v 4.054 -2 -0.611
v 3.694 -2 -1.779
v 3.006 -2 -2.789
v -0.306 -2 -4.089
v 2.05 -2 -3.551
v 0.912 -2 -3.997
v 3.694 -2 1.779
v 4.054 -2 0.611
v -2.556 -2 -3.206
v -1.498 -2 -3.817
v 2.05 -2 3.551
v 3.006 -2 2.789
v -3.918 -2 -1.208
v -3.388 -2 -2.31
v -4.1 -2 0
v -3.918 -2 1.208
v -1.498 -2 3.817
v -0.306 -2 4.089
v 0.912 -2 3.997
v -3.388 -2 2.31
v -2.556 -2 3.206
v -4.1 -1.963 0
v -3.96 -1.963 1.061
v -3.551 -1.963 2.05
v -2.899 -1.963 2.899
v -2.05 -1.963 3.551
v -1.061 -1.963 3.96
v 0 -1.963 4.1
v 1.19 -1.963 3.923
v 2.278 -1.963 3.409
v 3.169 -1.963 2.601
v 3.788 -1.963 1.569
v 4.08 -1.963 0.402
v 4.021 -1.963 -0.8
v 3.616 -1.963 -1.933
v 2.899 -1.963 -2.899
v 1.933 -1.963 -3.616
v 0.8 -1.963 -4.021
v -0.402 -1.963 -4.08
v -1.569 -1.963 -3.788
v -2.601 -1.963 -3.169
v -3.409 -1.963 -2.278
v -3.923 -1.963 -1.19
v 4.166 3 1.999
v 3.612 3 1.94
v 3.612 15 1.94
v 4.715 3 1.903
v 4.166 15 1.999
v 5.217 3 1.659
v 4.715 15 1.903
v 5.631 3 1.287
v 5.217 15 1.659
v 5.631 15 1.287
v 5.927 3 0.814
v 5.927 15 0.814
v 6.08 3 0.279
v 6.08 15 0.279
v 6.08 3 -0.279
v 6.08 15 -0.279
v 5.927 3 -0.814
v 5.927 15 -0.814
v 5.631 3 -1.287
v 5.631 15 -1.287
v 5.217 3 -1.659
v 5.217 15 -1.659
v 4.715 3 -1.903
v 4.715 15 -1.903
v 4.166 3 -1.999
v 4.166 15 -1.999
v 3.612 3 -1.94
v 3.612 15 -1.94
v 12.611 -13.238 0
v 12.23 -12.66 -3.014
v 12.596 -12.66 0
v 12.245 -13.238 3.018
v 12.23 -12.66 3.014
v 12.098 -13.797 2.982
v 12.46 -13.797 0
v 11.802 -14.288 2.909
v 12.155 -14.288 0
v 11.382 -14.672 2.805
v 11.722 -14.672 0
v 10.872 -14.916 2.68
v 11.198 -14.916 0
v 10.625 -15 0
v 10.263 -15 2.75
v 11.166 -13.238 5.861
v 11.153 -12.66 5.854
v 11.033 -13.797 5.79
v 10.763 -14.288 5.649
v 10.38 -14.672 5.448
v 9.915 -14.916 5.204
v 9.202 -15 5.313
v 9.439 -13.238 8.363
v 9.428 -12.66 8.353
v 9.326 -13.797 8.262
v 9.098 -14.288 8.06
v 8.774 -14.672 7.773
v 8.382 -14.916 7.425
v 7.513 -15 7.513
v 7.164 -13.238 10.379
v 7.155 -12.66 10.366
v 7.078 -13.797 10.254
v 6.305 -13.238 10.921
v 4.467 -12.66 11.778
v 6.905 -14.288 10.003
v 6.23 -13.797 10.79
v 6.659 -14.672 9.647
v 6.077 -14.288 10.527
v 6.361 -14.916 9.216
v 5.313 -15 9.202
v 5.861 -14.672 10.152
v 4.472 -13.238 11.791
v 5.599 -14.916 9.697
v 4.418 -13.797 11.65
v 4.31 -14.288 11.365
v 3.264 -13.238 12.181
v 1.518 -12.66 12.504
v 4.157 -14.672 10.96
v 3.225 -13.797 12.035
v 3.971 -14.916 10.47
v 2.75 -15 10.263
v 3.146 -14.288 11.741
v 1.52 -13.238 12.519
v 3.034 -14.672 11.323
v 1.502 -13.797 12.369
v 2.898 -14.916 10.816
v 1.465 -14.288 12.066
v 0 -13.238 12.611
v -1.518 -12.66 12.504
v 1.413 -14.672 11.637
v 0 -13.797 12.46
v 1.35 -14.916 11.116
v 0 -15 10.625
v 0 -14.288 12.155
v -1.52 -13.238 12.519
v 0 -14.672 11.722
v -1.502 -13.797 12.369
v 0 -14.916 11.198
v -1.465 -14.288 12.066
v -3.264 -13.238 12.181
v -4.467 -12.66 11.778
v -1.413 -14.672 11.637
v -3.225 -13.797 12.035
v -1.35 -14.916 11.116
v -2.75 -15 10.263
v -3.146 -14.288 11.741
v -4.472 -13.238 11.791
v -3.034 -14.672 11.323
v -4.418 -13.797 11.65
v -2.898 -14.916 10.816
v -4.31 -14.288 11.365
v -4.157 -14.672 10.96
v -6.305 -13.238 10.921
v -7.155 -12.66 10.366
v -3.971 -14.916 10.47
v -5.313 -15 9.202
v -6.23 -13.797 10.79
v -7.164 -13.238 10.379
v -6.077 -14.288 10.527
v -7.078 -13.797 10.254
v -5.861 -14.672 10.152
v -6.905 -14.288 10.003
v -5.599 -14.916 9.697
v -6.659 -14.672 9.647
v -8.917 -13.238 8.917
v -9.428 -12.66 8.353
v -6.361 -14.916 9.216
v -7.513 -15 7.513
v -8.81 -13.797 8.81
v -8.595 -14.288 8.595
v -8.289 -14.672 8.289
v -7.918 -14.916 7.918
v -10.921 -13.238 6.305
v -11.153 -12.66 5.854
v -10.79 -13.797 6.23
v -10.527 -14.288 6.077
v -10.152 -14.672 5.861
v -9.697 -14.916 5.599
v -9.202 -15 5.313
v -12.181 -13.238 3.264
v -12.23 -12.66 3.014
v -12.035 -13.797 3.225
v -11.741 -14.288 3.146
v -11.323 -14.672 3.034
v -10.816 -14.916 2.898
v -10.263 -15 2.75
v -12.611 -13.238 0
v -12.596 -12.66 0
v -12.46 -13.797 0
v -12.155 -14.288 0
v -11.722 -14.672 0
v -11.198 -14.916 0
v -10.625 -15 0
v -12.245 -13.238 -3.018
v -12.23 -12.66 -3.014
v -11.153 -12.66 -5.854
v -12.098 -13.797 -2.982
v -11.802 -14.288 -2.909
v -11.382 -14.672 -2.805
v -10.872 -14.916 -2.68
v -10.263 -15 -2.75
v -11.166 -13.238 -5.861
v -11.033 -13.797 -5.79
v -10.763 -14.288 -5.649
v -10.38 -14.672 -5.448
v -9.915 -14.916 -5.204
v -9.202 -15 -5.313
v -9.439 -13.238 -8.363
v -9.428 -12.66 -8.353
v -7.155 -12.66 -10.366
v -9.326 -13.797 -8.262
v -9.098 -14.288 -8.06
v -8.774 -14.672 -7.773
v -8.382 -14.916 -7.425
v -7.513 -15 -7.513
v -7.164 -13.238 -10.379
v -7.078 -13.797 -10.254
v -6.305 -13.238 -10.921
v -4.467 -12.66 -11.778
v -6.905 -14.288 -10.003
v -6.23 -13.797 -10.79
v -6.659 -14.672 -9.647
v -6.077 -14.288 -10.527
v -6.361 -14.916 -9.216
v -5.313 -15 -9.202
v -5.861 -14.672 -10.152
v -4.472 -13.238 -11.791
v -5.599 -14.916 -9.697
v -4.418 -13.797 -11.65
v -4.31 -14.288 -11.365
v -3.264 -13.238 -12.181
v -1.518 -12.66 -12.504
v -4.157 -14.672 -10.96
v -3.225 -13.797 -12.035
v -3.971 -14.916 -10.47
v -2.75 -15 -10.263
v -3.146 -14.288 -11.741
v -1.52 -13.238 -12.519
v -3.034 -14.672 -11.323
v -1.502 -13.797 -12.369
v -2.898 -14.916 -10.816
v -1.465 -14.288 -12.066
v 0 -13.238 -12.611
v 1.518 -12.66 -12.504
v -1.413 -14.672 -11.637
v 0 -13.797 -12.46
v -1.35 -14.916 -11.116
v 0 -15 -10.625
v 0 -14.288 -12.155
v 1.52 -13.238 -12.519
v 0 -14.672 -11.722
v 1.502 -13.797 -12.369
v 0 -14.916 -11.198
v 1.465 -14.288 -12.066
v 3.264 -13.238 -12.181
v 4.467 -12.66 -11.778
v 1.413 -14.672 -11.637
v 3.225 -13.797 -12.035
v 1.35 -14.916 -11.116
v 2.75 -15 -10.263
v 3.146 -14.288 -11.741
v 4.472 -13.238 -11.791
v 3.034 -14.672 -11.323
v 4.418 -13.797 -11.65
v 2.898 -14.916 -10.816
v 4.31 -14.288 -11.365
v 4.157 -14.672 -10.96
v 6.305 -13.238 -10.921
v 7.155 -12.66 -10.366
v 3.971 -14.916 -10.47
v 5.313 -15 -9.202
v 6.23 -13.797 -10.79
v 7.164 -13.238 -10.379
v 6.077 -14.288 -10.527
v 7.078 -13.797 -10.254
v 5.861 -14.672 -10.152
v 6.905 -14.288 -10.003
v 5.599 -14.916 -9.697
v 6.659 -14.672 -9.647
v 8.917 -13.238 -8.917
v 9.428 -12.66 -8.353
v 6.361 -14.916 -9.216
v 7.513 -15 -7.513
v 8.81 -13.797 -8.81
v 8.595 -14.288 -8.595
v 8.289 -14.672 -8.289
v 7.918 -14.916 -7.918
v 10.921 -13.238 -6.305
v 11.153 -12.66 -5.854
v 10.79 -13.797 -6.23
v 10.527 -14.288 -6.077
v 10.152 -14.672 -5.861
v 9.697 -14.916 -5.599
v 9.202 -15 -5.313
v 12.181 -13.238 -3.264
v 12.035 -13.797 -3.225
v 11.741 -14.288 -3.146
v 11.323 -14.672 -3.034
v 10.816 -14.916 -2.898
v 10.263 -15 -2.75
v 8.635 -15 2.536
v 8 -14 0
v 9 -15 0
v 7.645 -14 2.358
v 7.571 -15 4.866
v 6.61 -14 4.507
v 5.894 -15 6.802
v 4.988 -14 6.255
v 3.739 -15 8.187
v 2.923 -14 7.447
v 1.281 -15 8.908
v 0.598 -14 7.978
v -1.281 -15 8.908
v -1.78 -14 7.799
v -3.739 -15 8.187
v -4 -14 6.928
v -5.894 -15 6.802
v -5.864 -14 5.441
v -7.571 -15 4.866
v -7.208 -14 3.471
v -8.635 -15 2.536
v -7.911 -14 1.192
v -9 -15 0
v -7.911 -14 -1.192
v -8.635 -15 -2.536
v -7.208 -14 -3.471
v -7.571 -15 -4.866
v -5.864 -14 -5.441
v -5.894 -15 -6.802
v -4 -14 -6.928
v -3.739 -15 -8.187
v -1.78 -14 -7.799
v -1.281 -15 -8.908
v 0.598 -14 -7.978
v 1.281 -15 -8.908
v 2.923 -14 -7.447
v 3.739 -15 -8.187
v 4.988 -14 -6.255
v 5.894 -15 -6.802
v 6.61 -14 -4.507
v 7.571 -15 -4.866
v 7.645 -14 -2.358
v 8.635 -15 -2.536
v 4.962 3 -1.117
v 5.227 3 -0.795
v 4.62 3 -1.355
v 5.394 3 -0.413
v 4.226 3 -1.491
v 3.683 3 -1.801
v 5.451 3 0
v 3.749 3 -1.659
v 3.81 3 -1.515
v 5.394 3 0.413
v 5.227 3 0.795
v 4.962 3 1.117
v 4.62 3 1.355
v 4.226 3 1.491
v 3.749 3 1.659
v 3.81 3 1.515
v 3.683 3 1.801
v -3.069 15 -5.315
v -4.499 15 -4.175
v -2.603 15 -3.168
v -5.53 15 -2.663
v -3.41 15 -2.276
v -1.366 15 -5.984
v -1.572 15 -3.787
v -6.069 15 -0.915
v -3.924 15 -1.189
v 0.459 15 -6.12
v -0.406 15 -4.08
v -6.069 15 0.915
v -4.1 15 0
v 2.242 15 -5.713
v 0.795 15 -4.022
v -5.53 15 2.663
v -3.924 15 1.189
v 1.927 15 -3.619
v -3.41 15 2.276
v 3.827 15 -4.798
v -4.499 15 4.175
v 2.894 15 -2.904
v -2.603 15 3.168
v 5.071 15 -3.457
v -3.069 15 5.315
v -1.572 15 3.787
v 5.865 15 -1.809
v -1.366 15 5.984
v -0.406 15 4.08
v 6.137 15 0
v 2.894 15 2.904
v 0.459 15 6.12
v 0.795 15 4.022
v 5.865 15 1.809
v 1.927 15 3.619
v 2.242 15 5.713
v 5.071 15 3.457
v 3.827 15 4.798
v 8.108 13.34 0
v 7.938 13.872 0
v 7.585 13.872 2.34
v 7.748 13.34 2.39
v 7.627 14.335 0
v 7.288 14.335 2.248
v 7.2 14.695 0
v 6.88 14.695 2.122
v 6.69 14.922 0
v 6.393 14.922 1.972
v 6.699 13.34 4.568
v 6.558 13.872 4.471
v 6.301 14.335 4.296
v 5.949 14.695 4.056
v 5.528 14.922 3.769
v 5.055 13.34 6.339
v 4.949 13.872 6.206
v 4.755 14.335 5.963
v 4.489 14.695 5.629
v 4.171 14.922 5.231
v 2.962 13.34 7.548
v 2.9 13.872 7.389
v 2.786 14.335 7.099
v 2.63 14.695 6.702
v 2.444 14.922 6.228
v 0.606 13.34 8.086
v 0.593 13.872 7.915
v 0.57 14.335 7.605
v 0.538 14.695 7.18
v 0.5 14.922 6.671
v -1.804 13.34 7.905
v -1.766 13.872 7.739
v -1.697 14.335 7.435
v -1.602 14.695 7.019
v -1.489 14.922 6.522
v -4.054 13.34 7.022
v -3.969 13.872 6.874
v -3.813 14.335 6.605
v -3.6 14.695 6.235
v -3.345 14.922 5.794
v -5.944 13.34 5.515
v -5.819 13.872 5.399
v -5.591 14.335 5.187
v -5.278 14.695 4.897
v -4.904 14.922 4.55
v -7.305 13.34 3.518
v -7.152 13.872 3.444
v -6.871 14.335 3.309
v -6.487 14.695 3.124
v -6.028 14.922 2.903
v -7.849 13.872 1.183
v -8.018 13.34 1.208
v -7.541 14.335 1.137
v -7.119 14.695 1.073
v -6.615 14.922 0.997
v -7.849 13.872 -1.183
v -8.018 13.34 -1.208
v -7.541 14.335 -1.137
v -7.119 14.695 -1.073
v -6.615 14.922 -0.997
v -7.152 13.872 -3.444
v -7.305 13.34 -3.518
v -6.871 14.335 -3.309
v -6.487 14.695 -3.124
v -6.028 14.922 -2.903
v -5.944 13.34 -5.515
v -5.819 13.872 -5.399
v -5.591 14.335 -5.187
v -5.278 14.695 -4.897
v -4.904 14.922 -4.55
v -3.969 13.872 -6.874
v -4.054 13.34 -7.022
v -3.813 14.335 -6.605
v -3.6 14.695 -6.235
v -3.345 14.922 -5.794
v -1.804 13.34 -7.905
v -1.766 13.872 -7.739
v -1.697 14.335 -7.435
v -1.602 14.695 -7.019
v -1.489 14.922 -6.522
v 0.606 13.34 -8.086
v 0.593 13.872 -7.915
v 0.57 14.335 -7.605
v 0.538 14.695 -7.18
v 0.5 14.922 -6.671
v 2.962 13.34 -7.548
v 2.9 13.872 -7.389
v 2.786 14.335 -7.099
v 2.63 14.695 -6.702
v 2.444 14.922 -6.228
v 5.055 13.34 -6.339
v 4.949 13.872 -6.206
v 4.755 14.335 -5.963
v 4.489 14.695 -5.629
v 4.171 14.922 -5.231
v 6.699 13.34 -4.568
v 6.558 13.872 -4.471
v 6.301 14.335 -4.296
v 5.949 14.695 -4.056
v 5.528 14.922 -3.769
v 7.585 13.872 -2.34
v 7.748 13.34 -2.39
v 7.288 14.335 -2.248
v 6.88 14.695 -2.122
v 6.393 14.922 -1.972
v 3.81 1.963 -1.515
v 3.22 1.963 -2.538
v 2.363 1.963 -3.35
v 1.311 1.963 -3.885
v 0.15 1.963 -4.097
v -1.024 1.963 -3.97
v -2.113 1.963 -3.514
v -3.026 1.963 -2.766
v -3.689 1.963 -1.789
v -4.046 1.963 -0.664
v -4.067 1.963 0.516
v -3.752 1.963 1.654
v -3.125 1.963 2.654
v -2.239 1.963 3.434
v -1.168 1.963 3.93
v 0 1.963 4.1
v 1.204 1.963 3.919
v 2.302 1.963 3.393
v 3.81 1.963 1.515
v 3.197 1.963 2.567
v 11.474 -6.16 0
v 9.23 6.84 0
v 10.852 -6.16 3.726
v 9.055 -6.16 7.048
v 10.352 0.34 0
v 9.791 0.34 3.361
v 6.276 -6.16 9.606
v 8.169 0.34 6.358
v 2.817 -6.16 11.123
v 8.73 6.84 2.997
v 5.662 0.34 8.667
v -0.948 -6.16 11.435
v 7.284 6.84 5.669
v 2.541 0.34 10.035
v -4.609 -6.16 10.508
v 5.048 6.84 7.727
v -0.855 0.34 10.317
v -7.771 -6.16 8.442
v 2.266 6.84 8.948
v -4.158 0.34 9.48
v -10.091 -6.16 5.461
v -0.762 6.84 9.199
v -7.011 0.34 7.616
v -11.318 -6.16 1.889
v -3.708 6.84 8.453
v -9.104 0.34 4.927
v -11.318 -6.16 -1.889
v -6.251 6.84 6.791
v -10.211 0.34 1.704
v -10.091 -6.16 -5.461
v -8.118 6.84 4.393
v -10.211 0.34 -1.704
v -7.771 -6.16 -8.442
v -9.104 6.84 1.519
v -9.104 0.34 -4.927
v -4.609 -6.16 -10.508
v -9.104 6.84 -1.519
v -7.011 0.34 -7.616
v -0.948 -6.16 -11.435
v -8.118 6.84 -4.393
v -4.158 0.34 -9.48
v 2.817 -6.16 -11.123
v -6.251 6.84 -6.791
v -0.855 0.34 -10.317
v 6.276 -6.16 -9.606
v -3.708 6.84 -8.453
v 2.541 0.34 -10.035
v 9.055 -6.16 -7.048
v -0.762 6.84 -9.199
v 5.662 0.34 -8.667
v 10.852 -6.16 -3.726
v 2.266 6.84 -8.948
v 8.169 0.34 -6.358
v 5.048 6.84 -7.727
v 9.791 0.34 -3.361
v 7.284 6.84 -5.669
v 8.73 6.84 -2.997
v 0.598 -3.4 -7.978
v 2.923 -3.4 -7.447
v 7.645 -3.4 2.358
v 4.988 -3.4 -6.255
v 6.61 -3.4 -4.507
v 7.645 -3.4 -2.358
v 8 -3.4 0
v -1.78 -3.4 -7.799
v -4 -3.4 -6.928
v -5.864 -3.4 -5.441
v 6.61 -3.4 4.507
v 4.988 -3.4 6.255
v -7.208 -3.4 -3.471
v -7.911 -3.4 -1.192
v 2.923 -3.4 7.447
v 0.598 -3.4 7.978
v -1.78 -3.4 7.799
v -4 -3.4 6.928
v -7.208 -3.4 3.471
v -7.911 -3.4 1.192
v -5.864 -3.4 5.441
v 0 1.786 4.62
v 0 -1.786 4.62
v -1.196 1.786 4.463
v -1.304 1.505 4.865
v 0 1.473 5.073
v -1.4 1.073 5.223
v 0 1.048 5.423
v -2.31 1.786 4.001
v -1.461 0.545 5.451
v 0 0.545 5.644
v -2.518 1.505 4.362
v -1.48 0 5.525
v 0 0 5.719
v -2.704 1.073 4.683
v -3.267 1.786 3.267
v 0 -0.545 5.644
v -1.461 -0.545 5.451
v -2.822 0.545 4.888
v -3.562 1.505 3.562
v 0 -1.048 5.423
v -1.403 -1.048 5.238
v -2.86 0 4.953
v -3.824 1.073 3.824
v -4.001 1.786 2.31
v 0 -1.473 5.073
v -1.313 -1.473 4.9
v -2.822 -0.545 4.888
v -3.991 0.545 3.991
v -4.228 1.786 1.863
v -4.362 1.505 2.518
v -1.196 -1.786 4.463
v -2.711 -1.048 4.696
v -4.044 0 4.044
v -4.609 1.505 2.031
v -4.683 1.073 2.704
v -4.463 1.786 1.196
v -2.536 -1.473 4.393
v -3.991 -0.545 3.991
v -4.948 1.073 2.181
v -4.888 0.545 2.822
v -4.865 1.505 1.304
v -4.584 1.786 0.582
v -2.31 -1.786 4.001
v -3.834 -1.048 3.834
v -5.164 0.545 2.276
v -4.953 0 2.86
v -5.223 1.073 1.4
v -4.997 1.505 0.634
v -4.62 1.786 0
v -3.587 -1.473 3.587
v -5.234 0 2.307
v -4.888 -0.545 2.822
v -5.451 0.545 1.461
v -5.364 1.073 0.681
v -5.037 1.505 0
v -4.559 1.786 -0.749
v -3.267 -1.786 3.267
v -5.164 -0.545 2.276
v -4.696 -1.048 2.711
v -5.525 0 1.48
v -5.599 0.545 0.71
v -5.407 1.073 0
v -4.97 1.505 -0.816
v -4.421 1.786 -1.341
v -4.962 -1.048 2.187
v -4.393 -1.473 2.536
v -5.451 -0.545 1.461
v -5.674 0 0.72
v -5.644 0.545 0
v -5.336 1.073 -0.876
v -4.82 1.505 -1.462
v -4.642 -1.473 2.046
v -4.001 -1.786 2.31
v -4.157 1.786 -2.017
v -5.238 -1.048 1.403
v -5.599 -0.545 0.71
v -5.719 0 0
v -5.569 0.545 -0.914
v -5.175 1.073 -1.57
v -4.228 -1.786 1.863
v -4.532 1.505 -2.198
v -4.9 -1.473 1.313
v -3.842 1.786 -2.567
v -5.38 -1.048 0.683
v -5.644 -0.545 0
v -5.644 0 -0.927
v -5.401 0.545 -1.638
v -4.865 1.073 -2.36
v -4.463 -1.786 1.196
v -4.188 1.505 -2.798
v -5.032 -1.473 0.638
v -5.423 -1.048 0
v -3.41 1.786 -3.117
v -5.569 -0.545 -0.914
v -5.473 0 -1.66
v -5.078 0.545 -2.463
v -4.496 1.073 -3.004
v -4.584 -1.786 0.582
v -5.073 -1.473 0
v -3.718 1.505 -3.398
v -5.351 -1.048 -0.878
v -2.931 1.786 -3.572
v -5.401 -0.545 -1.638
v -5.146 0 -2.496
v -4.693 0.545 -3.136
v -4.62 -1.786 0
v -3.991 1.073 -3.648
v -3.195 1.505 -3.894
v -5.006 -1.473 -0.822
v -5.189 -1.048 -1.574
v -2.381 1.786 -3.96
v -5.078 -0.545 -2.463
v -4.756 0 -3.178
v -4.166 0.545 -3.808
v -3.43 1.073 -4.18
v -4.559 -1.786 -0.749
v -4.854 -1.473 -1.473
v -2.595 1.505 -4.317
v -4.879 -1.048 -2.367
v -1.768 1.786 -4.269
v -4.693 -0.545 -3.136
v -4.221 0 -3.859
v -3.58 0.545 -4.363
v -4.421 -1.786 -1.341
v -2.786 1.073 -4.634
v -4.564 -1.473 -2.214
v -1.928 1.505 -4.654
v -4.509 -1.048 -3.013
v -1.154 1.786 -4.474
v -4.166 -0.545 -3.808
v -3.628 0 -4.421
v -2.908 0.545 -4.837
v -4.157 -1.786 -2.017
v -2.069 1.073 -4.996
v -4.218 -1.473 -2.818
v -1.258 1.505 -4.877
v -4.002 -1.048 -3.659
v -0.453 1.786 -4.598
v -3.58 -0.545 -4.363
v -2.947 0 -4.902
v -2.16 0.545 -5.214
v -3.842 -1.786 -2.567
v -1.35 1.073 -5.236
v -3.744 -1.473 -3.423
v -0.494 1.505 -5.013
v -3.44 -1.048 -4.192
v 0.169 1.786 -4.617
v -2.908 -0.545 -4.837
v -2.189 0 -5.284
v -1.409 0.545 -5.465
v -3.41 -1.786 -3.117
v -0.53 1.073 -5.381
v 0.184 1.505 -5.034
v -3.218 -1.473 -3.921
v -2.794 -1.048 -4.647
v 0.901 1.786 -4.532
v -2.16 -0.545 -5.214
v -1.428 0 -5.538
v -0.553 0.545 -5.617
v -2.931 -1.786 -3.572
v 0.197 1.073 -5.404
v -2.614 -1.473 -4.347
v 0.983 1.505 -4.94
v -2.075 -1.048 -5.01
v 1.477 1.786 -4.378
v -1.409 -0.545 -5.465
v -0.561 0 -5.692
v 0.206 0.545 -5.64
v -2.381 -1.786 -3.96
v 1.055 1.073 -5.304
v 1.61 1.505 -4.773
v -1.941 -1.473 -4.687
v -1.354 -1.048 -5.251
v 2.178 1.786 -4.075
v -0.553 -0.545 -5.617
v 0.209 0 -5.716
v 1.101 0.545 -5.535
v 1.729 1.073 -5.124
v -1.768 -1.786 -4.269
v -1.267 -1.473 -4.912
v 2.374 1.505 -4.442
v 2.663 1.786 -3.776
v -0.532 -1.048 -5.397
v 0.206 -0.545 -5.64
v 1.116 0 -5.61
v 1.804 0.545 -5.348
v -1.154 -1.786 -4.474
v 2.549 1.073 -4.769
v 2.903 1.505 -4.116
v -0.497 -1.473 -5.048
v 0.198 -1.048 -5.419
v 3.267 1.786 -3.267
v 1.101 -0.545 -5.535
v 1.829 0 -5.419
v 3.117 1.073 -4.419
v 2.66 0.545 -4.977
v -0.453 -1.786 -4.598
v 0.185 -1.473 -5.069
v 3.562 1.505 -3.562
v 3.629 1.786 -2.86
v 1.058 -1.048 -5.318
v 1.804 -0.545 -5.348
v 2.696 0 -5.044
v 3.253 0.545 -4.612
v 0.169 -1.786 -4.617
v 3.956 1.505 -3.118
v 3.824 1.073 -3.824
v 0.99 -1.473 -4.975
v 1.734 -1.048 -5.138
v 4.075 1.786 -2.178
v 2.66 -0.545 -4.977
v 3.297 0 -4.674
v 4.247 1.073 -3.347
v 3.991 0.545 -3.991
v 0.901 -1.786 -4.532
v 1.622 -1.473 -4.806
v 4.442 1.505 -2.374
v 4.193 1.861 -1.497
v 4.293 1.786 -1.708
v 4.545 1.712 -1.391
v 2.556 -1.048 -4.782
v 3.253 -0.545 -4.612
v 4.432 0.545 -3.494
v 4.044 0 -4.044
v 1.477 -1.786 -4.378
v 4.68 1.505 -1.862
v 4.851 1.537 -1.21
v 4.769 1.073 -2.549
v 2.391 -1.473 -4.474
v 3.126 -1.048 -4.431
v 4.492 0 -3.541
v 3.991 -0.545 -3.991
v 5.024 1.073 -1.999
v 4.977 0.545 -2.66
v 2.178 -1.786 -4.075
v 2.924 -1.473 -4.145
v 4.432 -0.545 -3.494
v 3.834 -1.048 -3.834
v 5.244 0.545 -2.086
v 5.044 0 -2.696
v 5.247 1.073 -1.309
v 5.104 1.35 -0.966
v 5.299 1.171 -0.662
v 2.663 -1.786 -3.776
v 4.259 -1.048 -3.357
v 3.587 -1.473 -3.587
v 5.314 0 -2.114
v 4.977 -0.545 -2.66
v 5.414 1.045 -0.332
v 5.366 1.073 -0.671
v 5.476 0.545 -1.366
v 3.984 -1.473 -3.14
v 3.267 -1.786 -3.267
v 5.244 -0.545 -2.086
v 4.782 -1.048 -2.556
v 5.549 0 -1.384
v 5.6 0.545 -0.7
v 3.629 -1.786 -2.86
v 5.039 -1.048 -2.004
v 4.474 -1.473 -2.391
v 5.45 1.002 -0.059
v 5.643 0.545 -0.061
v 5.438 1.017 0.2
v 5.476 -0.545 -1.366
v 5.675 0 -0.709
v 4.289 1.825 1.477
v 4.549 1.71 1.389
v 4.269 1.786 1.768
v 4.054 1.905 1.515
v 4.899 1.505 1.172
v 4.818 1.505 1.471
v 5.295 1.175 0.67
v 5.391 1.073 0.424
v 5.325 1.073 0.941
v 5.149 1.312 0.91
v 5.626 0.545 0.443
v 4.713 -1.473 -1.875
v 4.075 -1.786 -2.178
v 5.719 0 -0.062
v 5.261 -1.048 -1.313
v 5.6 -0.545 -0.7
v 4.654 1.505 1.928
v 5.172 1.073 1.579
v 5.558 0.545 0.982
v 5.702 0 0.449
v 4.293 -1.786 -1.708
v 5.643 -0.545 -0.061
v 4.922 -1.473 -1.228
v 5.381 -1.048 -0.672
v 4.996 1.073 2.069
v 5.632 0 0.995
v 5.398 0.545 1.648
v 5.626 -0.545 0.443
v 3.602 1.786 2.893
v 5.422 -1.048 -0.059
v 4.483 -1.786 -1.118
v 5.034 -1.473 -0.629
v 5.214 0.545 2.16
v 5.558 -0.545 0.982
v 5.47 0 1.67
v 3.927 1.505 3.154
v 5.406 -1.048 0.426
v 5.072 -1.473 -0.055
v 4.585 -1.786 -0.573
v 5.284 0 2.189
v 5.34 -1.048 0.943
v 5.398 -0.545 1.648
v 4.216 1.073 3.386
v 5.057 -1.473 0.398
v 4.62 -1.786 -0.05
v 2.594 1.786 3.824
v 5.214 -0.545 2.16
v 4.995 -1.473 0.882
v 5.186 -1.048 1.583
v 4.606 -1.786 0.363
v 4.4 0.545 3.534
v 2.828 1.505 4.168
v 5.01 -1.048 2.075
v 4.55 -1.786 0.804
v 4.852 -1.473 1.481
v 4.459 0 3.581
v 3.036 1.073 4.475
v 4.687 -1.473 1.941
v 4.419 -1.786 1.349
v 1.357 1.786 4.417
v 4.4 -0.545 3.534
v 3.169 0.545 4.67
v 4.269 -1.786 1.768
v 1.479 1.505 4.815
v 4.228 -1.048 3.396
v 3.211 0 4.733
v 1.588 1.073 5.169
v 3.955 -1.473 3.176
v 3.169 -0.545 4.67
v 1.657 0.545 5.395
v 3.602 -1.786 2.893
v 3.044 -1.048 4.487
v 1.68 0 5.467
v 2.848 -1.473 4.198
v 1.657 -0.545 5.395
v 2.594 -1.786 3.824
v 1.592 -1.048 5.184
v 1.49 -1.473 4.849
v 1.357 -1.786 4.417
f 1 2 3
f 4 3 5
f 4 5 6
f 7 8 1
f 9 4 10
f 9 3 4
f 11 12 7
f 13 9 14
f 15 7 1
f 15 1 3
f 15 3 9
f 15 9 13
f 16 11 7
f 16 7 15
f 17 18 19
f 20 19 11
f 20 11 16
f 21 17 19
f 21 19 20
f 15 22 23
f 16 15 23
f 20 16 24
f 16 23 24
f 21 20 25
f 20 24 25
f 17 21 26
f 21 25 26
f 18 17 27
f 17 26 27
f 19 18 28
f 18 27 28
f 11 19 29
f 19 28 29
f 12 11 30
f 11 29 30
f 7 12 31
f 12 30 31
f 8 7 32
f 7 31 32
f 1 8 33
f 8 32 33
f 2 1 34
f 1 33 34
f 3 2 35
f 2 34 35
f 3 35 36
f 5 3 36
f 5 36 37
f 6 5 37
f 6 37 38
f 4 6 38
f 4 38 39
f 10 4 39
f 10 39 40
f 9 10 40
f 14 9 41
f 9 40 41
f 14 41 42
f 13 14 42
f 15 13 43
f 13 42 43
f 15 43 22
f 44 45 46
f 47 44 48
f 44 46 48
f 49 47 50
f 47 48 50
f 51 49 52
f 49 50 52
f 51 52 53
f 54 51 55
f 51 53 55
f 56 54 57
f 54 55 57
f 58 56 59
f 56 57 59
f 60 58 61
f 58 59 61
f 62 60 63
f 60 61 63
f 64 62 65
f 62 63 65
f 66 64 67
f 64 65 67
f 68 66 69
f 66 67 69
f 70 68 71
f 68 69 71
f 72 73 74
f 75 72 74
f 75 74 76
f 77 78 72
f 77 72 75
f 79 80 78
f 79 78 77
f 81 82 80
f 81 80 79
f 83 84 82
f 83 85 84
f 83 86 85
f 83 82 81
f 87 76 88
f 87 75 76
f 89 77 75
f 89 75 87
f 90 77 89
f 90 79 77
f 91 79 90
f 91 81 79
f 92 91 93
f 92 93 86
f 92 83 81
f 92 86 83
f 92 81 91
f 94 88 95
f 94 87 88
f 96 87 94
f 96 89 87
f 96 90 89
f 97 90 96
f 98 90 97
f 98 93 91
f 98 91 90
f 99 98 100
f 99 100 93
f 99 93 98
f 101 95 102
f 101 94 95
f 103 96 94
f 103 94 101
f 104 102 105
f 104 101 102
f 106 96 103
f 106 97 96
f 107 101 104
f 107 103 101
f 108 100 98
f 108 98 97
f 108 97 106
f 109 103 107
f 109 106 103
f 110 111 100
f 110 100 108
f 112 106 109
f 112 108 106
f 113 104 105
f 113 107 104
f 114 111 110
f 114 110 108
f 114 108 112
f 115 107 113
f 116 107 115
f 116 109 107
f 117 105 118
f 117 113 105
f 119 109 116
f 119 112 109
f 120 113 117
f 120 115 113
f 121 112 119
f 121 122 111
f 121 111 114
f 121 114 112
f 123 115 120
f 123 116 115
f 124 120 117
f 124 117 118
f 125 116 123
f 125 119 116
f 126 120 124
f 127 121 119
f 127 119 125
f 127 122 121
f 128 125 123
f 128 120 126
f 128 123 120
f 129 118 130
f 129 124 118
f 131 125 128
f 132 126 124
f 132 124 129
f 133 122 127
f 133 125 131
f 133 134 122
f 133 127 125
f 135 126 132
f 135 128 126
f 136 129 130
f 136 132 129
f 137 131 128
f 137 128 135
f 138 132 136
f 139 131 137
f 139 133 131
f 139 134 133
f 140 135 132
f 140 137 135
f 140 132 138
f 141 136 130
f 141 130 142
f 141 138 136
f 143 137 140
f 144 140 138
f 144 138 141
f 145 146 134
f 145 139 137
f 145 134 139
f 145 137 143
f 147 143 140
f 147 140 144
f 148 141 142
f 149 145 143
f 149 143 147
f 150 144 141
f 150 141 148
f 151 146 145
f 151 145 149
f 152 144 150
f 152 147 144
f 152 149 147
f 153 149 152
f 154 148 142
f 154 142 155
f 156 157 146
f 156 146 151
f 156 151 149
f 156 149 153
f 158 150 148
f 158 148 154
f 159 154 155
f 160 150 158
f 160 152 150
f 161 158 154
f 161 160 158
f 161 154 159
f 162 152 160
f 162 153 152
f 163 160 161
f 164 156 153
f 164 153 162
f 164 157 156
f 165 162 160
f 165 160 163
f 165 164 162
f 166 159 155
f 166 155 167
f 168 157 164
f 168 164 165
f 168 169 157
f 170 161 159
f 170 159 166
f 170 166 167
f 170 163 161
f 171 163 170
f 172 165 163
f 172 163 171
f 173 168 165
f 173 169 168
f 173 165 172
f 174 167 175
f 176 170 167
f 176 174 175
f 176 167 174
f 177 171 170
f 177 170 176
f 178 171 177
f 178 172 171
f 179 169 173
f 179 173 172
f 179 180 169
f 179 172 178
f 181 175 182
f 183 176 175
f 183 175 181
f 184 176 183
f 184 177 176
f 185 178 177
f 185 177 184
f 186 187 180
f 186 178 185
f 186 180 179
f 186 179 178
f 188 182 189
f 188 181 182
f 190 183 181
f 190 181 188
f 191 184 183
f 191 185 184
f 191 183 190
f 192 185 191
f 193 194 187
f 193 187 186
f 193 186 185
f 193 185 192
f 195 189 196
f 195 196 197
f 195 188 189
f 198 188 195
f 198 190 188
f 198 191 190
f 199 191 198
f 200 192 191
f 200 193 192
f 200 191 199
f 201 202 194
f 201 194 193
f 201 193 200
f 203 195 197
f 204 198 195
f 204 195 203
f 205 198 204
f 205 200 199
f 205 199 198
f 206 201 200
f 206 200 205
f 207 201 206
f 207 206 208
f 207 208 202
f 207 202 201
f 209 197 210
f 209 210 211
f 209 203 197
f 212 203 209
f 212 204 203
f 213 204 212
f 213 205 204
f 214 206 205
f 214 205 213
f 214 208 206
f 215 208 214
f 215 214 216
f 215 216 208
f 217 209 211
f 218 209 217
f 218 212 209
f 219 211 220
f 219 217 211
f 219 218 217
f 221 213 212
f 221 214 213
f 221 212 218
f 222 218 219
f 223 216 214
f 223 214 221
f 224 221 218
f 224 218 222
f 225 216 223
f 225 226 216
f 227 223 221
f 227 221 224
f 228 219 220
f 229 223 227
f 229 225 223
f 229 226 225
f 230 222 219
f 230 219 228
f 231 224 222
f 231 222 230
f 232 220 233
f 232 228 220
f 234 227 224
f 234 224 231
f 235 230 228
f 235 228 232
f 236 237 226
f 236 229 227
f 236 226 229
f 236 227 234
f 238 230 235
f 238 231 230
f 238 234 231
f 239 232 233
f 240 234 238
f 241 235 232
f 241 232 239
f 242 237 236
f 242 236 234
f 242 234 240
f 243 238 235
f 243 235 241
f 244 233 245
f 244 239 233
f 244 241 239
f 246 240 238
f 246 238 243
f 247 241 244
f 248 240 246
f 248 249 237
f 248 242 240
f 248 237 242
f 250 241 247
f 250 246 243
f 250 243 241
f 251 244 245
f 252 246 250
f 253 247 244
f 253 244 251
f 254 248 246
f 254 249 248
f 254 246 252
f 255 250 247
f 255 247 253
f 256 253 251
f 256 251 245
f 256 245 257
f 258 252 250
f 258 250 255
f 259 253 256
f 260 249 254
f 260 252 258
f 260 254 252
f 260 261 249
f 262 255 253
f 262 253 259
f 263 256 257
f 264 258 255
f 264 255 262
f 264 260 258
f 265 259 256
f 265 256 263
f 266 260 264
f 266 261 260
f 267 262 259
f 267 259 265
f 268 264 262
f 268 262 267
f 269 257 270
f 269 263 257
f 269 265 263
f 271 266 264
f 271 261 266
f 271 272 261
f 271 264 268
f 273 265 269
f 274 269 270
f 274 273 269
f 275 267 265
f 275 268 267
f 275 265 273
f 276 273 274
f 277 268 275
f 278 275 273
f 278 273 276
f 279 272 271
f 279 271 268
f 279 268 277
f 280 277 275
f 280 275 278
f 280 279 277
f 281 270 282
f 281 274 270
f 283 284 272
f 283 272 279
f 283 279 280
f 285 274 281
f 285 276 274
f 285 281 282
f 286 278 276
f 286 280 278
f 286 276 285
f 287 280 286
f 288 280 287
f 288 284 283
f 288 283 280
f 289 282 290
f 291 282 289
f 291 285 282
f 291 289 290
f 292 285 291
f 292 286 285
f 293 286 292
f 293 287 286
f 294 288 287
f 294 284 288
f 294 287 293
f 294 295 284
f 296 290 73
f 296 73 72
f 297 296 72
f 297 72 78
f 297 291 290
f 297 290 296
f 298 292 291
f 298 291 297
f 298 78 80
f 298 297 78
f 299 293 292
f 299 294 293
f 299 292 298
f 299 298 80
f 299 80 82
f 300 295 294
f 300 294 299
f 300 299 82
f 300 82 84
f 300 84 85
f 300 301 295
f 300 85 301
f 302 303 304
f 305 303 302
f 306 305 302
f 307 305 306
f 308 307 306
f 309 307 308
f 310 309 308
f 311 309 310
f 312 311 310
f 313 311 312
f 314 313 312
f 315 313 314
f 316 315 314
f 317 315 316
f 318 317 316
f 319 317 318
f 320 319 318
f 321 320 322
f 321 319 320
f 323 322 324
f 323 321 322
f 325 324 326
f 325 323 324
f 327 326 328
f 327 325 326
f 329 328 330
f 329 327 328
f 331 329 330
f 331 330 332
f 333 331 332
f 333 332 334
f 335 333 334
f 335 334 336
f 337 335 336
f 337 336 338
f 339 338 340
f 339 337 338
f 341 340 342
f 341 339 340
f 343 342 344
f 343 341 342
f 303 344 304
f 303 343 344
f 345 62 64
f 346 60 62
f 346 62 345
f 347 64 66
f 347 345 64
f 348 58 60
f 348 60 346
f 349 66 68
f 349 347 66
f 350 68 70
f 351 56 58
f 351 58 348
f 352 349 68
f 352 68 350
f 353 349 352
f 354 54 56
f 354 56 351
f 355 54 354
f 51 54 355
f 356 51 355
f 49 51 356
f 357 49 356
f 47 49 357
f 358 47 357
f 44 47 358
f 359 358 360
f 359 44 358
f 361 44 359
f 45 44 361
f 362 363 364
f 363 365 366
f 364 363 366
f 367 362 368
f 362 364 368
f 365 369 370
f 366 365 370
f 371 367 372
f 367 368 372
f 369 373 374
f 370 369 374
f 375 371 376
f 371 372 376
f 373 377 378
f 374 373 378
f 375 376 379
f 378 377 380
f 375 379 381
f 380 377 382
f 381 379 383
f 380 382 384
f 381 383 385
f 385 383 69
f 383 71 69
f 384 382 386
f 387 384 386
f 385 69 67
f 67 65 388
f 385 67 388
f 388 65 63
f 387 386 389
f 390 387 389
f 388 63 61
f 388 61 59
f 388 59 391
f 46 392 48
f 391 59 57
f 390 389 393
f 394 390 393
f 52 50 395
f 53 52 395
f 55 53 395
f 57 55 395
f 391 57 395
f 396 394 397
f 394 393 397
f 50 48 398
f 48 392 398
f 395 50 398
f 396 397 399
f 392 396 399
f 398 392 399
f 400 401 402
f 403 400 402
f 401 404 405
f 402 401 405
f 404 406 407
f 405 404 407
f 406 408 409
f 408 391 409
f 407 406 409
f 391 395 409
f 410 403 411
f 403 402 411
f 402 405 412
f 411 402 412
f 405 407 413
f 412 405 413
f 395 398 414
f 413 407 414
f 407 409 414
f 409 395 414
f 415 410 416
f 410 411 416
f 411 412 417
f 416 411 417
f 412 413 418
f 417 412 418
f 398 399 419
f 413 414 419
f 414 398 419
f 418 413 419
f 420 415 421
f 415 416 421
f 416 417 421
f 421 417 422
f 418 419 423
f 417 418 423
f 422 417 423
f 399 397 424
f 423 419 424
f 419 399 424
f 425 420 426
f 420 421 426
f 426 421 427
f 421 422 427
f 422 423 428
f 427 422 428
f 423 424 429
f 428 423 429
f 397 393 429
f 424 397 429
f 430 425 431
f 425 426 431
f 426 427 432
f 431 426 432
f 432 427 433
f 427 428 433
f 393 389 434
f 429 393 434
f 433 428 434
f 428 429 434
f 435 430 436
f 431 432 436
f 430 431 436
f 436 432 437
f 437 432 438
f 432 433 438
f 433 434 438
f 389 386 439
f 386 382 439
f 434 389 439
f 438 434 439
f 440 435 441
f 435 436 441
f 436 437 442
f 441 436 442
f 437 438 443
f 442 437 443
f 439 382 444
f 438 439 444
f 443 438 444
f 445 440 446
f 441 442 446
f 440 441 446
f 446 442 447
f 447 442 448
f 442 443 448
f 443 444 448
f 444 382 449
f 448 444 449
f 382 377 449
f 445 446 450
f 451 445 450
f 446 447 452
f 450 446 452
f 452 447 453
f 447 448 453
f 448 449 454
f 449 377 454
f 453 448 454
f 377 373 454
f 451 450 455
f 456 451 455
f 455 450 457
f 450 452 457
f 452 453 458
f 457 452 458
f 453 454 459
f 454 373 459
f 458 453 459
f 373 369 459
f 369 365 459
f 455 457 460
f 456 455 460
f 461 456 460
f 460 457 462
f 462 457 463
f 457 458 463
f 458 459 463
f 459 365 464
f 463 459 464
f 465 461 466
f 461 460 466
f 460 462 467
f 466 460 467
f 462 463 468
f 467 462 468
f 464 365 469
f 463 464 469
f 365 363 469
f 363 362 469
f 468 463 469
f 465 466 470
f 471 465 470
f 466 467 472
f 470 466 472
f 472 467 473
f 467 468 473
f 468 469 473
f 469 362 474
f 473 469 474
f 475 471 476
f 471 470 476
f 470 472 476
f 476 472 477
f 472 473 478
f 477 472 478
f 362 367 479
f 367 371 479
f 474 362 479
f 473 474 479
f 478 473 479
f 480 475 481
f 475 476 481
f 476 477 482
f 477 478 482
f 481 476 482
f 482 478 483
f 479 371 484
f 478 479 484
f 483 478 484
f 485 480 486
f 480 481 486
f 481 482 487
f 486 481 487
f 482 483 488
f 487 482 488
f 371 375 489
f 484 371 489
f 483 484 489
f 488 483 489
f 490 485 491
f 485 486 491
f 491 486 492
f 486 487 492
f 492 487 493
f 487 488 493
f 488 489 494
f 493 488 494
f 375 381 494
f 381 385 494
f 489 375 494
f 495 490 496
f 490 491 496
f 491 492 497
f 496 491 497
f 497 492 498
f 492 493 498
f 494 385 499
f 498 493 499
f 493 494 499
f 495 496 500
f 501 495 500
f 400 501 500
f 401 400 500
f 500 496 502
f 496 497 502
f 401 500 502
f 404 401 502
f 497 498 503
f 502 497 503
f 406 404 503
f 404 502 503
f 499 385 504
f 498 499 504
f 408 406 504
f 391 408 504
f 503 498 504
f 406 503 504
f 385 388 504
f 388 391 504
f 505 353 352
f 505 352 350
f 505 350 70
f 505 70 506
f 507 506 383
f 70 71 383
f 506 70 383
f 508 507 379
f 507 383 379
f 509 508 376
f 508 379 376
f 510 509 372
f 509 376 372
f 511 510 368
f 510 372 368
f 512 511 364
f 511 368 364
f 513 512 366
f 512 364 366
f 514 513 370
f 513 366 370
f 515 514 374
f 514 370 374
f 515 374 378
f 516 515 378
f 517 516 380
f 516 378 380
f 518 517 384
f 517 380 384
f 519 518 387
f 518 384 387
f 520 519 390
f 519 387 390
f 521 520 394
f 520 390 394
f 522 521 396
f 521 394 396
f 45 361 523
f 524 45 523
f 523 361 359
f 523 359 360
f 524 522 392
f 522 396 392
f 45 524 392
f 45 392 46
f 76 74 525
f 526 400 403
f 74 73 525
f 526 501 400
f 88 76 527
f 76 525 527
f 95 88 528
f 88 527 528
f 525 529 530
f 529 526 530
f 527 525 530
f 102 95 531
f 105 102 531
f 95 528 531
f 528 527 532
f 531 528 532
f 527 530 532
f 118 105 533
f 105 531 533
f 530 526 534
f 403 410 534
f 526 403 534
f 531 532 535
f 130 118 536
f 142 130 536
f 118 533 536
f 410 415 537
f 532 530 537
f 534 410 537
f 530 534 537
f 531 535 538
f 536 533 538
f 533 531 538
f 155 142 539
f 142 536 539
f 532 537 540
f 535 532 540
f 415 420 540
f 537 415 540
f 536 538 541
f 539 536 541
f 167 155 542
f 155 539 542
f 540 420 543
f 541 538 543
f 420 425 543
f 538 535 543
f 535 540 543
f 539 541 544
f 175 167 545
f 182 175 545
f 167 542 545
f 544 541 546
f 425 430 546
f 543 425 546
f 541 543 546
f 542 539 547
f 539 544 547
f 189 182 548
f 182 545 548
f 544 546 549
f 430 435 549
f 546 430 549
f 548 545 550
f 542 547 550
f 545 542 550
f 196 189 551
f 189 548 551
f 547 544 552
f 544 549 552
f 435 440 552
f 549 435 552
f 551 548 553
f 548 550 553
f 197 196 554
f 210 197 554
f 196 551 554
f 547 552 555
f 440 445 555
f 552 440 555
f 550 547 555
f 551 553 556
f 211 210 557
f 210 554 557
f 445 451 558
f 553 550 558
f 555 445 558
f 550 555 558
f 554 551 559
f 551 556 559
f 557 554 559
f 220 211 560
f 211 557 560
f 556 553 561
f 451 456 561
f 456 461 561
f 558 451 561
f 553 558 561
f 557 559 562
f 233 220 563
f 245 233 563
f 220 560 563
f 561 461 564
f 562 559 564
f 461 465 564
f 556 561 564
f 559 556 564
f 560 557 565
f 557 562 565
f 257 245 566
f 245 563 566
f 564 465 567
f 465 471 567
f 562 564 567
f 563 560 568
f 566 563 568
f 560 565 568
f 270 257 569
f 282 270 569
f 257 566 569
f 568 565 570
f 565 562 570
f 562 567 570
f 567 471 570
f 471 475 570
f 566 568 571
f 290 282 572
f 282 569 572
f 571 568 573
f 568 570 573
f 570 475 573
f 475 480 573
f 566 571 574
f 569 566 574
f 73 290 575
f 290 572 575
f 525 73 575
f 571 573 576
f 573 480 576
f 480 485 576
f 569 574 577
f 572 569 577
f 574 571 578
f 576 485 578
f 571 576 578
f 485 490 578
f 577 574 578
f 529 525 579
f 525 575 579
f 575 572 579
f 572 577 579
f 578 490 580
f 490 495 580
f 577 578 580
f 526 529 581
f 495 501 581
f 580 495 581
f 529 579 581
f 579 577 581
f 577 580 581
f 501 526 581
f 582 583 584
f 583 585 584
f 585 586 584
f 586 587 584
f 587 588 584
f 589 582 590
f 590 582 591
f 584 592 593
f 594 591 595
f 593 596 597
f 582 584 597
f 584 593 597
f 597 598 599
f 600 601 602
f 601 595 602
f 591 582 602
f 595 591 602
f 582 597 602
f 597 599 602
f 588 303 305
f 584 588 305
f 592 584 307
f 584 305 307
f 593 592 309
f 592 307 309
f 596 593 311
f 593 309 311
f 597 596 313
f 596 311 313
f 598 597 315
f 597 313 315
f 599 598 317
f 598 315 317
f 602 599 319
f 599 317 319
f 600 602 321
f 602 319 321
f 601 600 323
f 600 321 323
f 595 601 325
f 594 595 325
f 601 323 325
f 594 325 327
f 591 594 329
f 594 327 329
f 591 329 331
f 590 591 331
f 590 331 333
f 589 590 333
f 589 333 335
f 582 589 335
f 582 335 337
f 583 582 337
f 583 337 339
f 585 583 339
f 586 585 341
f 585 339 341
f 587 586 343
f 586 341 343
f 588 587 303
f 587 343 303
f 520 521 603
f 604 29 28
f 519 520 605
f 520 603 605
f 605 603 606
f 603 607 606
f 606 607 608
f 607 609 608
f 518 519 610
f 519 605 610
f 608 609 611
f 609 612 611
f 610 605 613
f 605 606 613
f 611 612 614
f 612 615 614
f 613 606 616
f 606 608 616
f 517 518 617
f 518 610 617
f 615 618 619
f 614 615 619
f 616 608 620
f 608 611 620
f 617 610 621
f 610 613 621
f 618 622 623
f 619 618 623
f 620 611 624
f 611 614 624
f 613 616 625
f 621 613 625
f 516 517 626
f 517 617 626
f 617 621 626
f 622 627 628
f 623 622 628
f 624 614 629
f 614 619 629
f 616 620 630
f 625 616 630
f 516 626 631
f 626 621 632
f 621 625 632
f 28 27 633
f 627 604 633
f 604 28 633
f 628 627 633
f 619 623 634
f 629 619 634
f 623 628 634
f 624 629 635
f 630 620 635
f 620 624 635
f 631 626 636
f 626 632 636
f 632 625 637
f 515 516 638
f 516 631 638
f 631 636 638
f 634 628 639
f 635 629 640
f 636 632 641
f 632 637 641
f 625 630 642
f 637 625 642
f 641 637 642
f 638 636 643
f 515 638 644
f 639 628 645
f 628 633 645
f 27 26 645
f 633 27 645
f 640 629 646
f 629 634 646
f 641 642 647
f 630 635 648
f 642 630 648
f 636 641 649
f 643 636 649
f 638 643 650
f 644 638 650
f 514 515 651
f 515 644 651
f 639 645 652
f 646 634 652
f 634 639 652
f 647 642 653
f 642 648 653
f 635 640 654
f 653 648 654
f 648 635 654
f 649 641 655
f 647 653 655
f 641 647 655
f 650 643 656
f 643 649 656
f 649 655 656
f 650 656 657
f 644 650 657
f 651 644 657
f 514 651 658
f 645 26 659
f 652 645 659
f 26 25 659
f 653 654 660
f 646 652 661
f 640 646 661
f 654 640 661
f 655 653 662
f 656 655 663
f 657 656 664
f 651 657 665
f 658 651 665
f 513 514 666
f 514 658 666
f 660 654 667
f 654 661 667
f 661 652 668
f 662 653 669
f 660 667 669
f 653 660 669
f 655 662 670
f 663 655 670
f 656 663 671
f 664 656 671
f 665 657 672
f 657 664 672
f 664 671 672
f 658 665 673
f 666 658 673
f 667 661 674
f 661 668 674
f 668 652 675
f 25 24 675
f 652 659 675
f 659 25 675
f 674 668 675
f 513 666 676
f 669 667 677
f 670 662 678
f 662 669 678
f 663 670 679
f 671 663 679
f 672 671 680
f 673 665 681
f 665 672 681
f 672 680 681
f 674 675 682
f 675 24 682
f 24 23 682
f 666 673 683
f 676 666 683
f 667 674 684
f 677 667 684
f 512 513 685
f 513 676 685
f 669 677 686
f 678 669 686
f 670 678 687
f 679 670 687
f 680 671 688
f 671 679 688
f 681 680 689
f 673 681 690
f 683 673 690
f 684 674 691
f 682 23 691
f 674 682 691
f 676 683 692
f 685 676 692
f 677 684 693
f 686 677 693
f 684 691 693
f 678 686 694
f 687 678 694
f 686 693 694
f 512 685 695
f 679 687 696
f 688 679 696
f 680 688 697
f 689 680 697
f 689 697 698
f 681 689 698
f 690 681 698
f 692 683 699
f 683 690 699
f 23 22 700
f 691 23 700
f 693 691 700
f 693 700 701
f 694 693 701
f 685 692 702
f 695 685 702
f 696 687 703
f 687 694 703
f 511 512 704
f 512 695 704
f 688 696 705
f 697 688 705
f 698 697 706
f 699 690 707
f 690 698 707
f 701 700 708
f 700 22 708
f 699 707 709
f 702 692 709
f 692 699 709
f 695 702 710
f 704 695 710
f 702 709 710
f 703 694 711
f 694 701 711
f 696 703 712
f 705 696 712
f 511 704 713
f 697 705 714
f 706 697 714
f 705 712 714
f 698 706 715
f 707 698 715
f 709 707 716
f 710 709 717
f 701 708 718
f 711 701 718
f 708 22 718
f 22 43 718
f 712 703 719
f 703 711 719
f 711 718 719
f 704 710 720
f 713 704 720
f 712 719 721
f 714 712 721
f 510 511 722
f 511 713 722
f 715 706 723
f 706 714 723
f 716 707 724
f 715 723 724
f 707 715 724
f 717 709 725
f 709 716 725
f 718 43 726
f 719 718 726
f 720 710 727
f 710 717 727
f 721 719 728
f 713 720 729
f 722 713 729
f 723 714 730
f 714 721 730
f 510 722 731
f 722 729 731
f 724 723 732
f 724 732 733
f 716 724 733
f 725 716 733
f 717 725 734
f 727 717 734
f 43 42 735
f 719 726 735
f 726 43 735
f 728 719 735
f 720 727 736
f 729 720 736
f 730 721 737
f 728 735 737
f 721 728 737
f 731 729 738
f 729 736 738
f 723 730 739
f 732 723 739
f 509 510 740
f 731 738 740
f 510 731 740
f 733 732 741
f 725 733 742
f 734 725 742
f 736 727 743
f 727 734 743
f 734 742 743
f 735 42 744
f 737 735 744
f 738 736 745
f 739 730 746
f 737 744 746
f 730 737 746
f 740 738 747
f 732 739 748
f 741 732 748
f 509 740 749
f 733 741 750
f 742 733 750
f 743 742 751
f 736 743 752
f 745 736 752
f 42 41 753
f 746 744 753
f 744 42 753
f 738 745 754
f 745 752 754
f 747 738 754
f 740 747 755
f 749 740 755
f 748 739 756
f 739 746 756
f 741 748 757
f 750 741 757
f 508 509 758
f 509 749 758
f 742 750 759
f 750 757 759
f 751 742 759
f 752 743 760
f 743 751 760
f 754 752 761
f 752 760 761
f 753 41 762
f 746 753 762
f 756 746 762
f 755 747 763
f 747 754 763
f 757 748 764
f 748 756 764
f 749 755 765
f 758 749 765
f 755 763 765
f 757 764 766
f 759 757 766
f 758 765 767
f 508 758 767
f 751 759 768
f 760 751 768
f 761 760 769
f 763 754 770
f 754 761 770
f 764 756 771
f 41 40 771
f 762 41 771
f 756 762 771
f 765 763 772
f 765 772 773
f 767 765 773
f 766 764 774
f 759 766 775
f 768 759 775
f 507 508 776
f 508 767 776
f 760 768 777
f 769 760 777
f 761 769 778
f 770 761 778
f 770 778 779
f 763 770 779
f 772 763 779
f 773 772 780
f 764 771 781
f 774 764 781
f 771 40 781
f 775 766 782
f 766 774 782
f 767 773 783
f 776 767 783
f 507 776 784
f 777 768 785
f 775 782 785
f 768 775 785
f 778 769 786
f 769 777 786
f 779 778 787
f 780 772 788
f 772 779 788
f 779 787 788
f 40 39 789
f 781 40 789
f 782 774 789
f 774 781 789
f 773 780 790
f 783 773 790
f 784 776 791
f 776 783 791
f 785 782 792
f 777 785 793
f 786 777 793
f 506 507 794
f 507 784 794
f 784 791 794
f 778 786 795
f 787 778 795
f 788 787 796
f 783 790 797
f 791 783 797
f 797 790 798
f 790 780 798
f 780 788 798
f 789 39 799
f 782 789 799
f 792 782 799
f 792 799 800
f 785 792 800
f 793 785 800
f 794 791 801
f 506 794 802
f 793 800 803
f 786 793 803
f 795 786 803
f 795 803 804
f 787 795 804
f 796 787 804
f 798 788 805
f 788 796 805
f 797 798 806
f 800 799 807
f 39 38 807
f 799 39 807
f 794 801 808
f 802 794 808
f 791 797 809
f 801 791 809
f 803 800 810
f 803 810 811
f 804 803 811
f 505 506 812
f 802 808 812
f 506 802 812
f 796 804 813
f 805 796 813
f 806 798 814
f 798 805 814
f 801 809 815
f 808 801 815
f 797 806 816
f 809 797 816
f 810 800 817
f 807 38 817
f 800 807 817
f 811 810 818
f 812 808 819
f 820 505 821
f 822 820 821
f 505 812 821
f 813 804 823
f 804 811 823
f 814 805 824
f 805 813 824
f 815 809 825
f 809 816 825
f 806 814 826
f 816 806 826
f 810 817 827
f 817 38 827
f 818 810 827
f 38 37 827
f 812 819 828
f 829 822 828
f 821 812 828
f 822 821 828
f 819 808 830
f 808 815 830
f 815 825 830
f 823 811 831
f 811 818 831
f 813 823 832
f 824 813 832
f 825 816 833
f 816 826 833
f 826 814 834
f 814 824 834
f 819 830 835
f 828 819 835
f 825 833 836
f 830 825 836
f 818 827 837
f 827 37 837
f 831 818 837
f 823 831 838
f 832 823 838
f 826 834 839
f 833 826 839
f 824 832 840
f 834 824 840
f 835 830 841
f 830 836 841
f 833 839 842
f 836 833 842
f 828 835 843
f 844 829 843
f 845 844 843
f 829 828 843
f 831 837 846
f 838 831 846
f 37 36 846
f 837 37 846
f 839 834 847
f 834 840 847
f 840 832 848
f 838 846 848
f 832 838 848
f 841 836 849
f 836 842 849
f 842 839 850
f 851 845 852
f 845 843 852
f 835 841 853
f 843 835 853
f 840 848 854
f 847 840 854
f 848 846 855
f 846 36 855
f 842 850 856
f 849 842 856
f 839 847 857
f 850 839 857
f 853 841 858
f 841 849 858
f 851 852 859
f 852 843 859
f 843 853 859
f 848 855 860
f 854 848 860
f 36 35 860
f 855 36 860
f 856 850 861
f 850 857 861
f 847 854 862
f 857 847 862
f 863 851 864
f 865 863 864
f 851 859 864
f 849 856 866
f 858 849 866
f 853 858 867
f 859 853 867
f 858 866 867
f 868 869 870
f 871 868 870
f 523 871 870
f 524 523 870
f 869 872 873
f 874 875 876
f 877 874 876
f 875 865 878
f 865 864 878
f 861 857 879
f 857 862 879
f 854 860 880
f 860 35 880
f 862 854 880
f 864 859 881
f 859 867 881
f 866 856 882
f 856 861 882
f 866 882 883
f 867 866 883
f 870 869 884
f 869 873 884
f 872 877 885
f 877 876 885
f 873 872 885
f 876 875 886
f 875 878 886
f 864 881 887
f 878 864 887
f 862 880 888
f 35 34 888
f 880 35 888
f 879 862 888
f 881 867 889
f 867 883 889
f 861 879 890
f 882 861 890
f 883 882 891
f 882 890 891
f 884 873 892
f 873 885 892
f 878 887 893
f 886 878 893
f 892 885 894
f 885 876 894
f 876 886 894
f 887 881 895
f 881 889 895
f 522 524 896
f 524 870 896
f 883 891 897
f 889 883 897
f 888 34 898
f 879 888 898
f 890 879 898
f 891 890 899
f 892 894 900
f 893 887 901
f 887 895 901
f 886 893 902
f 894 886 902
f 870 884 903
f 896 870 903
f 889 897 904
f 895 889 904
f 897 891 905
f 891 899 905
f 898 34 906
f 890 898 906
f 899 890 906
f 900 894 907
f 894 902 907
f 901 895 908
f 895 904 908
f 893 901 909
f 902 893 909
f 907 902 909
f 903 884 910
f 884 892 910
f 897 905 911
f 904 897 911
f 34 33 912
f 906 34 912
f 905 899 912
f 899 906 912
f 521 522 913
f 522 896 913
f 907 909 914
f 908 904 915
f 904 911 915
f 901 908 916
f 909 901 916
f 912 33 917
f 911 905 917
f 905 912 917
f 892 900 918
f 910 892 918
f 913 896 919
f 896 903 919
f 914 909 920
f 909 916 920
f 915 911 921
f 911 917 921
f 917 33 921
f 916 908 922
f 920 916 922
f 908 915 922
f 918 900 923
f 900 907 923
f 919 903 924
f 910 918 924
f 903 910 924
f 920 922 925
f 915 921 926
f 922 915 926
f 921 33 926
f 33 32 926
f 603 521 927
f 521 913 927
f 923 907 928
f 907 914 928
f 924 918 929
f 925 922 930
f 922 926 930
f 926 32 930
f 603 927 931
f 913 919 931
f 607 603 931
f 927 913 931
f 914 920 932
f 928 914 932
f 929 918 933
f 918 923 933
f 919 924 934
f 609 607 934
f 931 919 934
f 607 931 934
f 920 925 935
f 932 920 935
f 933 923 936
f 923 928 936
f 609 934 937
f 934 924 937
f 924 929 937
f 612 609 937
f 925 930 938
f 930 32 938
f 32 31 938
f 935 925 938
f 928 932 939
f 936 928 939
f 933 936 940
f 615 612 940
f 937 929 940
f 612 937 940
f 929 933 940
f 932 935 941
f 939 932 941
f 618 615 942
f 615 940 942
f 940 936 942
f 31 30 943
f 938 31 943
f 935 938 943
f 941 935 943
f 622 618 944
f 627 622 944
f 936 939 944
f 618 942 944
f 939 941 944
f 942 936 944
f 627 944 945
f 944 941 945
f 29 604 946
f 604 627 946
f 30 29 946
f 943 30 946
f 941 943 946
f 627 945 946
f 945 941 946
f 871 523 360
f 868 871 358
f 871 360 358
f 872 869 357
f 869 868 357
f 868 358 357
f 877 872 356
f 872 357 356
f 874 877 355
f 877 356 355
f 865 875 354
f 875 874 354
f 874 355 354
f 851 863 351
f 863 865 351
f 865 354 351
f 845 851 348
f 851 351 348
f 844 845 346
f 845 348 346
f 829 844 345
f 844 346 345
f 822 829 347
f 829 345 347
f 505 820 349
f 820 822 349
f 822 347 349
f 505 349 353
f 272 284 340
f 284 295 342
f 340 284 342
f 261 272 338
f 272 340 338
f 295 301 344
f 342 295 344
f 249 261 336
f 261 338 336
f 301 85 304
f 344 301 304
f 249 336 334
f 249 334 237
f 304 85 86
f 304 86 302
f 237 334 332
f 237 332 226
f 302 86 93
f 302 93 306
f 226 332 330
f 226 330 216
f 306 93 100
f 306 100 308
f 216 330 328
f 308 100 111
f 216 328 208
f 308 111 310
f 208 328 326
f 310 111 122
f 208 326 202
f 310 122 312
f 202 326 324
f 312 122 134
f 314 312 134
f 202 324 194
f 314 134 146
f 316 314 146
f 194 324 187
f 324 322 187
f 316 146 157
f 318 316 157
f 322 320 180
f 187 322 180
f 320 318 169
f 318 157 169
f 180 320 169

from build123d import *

# Parameters (mm, degrees)
F2_R      = 4.1
F3_DEPTH  = 17
F4_R      = 2
F6_R      = 2
F7_DEPTH  = 12
F8_R      = 2
F9_SIZE   = 1
F10_R     = 1.5202998137
F11_DEPTH = 14


with BuildPart() as f1:
    # F0 (on Top) → F1 (revolve)
    with BuildSketch(Plane.XY):
        Polygon((13, -15), (7.821855842, 15), (0, 15), (0, -3.4), (8, -3.4), (8, -15), align=None)
    revolve(axis=Axis((0, 5.8, 0), (0, -1, 0)))

    # F2 (on face) → F3 (cut)
    with BuildSketch(Plane(origin=(0, 15, 0), x_dir=(-1, 0, 0), z_dir=(0, 1, 0))):
        Circle(F2_R)
    extrude(amount=-F3_DEPTH, mode=Mode.SUBTRACT)

    # F5: sweep along a path in F5_path
    with BuildLine(Plane(origin=(-4.1, -2, 0), x_dir=(0, 0, 1), z_dir=(0, -1, 0))) as f5_path:
        CenterArc((0, -4.1), 4.1, 0, 360)
    # F4 (on Right) → F5 (sweep, cut)
    with BuildSketch(Plane.YZ):
        with Locations((0, 3.7194299512)):
            Circle(F4_R)
    sweep(path=f5_path.line, mode=Mode.SUBTRACT)

    # F6 (on face) → F7 (cut)
    with BuildSketch(Plane(origin=(0, 15, 0), x_dir=(-1, 0, 0), z_dir=(0, 1, 0))):
        with Locations((-4.1, 0)):
            Circle(F6_R)
    extrude(amount=-F7_DEPTH, mode=Mode.SUBTRACT)

    # F8
    f8_edges = [f1.edges().sort_by_distance(p)[0] for p in [
        (-7.821856, 15, 0),
        (-13, -15, 0),
    ]]
    fillet(f8_edges, radius=F8_R)

    # F9
    f9_edges = [f1.edges().sort_by_distance(p)[0] for p in [
        (-8, -15, 0),
    ]]
    chamfer(f9_edges, length=F9_SIZE)

    # F10 (on face) → F11 (cut)
    with BuildSketch(Plane(origin=(0, 15, 0), x_dir=(-1, 0, 0), z_dir=(0, 1, 0))):
        with Locations((-3.9308541454, 0)):
            Circle(F10_R)
    extrude(amount=-F11_DEPTH, mode=Mode.SUBTRACT)


solid = f1.part
